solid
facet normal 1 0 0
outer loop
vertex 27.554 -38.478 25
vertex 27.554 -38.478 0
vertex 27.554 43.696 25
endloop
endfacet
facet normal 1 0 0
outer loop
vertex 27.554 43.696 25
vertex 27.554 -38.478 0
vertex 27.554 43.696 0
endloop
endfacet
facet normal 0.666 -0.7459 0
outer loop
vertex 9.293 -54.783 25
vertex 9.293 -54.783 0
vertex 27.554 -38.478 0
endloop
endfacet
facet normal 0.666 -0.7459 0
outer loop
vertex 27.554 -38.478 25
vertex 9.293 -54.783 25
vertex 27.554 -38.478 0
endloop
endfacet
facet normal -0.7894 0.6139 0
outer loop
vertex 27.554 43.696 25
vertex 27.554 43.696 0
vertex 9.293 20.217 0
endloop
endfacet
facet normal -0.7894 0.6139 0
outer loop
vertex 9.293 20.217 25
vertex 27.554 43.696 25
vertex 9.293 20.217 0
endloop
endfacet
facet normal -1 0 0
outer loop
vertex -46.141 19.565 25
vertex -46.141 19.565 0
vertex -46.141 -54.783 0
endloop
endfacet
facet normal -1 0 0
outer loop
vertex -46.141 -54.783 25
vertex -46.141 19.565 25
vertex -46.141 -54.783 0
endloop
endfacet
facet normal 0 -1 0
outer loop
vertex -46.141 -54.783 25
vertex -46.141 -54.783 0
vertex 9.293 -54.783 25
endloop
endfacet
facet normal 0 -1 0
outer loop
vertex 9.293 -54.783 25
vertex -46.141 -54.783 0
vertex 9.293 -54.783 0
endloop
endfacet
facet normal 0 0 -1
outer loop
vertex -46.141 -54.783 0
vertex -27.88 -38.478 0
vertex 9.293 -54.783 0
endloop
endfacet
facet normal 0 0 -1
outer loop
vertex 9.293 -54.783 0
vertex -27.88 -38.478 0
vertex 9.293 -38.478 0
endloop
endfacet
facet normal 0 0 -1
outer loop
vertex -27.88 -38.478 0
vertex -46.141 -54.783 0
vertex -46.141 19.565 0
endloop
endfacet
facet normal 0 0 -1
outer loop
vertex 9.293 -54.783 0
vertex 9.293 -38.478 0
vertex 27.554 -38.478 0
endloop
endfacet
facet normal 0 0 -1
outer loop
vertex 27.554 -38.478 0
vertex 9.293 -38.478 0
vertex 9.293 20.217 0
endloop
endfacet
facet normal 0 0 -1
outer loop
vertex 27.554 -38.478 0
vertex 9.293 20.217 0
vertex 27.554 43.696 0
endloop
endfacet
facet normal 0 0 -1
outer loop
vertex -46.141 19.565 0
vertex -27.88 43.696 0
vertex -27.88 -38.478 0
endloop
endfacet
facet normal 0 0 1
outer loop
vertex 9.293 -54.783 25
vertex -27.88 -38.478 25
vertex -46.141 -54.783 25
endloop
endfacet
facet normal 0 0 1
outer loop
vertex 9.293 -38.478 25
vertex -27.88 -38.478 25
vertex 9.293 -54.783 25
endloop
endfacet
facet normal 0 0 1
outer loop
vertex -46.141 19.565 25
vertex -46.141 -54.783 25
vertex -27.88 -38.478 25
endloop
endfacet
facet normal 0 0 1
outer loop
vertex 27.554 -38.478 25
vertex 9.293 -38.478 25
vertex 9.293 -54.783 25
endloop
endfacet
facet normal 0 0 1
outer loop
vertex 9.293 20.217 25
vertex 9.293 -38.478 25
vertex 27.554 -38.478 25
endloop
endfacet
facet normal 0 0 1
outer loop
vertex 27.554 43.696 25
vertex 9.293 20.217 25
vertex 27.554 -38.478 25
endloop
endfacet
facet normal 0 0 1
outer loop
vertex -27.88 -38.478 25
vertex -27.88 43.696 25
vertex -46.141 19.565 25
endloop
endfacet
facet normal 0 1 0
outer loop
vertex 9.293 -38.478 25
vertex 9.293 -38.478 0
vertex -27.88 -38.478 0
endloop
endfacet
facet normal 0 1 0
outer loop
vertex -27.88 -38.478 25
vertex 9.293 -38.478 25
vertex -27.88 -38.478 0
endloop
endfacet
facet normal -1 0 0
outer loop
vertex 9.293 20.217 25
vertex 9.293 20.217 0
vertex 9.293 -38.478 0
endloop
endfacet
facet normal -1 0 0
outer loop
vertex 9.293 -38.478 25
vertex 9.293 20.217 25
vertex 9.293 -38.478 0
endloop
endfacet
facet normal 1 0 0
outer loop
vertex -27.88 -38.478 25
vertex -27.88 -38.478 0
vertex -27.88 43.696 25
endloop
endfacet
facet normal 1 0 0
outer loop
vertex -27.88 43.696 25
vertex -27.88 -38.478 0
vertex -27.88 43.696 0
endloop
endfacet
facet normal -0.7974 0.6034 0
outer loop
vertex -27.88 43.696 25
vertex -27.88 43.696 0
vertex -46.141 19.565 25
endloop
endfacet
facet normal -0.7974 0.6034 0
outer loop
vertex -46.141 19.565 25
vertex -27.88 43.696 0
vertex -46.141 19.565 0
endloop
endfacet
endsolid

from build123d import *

# Parameters (mm, degrees)
F1_DEPTH = 25


with BuildPart() as f1:
    # F0 (on Top) → F1 (new body)
    with BuildSketch(Plane.XY):
        Polygon((9.293479, -54.78261), (27.554348, -38.478263), (9.293479, -38.478263), align=None)
        Polygon((-27.880436, 19.780052), (-27.880436, 43.695655), (-46.141308, 19.565219), align=None)
        Polygon((27.554348, 0), (27.554348, 43.695655), (9.293479, 20.217391), (9.293479, -38.478263), (27.554348, -38.478263), align=None)
        Polygon((9.293479, -54.78261), (9.293479, -38.478263), (-27.880436, -38.478263), (-46.141308, -54.78261), align=None)
        Polygon((-27.880436, -38.478263), (-27.880436, 19.780052), (-46.141308, 19.565219), (-46.141308, -54.78261), align=None)
    extrude(amount=F1_DEPTH)


solid = f1.part
